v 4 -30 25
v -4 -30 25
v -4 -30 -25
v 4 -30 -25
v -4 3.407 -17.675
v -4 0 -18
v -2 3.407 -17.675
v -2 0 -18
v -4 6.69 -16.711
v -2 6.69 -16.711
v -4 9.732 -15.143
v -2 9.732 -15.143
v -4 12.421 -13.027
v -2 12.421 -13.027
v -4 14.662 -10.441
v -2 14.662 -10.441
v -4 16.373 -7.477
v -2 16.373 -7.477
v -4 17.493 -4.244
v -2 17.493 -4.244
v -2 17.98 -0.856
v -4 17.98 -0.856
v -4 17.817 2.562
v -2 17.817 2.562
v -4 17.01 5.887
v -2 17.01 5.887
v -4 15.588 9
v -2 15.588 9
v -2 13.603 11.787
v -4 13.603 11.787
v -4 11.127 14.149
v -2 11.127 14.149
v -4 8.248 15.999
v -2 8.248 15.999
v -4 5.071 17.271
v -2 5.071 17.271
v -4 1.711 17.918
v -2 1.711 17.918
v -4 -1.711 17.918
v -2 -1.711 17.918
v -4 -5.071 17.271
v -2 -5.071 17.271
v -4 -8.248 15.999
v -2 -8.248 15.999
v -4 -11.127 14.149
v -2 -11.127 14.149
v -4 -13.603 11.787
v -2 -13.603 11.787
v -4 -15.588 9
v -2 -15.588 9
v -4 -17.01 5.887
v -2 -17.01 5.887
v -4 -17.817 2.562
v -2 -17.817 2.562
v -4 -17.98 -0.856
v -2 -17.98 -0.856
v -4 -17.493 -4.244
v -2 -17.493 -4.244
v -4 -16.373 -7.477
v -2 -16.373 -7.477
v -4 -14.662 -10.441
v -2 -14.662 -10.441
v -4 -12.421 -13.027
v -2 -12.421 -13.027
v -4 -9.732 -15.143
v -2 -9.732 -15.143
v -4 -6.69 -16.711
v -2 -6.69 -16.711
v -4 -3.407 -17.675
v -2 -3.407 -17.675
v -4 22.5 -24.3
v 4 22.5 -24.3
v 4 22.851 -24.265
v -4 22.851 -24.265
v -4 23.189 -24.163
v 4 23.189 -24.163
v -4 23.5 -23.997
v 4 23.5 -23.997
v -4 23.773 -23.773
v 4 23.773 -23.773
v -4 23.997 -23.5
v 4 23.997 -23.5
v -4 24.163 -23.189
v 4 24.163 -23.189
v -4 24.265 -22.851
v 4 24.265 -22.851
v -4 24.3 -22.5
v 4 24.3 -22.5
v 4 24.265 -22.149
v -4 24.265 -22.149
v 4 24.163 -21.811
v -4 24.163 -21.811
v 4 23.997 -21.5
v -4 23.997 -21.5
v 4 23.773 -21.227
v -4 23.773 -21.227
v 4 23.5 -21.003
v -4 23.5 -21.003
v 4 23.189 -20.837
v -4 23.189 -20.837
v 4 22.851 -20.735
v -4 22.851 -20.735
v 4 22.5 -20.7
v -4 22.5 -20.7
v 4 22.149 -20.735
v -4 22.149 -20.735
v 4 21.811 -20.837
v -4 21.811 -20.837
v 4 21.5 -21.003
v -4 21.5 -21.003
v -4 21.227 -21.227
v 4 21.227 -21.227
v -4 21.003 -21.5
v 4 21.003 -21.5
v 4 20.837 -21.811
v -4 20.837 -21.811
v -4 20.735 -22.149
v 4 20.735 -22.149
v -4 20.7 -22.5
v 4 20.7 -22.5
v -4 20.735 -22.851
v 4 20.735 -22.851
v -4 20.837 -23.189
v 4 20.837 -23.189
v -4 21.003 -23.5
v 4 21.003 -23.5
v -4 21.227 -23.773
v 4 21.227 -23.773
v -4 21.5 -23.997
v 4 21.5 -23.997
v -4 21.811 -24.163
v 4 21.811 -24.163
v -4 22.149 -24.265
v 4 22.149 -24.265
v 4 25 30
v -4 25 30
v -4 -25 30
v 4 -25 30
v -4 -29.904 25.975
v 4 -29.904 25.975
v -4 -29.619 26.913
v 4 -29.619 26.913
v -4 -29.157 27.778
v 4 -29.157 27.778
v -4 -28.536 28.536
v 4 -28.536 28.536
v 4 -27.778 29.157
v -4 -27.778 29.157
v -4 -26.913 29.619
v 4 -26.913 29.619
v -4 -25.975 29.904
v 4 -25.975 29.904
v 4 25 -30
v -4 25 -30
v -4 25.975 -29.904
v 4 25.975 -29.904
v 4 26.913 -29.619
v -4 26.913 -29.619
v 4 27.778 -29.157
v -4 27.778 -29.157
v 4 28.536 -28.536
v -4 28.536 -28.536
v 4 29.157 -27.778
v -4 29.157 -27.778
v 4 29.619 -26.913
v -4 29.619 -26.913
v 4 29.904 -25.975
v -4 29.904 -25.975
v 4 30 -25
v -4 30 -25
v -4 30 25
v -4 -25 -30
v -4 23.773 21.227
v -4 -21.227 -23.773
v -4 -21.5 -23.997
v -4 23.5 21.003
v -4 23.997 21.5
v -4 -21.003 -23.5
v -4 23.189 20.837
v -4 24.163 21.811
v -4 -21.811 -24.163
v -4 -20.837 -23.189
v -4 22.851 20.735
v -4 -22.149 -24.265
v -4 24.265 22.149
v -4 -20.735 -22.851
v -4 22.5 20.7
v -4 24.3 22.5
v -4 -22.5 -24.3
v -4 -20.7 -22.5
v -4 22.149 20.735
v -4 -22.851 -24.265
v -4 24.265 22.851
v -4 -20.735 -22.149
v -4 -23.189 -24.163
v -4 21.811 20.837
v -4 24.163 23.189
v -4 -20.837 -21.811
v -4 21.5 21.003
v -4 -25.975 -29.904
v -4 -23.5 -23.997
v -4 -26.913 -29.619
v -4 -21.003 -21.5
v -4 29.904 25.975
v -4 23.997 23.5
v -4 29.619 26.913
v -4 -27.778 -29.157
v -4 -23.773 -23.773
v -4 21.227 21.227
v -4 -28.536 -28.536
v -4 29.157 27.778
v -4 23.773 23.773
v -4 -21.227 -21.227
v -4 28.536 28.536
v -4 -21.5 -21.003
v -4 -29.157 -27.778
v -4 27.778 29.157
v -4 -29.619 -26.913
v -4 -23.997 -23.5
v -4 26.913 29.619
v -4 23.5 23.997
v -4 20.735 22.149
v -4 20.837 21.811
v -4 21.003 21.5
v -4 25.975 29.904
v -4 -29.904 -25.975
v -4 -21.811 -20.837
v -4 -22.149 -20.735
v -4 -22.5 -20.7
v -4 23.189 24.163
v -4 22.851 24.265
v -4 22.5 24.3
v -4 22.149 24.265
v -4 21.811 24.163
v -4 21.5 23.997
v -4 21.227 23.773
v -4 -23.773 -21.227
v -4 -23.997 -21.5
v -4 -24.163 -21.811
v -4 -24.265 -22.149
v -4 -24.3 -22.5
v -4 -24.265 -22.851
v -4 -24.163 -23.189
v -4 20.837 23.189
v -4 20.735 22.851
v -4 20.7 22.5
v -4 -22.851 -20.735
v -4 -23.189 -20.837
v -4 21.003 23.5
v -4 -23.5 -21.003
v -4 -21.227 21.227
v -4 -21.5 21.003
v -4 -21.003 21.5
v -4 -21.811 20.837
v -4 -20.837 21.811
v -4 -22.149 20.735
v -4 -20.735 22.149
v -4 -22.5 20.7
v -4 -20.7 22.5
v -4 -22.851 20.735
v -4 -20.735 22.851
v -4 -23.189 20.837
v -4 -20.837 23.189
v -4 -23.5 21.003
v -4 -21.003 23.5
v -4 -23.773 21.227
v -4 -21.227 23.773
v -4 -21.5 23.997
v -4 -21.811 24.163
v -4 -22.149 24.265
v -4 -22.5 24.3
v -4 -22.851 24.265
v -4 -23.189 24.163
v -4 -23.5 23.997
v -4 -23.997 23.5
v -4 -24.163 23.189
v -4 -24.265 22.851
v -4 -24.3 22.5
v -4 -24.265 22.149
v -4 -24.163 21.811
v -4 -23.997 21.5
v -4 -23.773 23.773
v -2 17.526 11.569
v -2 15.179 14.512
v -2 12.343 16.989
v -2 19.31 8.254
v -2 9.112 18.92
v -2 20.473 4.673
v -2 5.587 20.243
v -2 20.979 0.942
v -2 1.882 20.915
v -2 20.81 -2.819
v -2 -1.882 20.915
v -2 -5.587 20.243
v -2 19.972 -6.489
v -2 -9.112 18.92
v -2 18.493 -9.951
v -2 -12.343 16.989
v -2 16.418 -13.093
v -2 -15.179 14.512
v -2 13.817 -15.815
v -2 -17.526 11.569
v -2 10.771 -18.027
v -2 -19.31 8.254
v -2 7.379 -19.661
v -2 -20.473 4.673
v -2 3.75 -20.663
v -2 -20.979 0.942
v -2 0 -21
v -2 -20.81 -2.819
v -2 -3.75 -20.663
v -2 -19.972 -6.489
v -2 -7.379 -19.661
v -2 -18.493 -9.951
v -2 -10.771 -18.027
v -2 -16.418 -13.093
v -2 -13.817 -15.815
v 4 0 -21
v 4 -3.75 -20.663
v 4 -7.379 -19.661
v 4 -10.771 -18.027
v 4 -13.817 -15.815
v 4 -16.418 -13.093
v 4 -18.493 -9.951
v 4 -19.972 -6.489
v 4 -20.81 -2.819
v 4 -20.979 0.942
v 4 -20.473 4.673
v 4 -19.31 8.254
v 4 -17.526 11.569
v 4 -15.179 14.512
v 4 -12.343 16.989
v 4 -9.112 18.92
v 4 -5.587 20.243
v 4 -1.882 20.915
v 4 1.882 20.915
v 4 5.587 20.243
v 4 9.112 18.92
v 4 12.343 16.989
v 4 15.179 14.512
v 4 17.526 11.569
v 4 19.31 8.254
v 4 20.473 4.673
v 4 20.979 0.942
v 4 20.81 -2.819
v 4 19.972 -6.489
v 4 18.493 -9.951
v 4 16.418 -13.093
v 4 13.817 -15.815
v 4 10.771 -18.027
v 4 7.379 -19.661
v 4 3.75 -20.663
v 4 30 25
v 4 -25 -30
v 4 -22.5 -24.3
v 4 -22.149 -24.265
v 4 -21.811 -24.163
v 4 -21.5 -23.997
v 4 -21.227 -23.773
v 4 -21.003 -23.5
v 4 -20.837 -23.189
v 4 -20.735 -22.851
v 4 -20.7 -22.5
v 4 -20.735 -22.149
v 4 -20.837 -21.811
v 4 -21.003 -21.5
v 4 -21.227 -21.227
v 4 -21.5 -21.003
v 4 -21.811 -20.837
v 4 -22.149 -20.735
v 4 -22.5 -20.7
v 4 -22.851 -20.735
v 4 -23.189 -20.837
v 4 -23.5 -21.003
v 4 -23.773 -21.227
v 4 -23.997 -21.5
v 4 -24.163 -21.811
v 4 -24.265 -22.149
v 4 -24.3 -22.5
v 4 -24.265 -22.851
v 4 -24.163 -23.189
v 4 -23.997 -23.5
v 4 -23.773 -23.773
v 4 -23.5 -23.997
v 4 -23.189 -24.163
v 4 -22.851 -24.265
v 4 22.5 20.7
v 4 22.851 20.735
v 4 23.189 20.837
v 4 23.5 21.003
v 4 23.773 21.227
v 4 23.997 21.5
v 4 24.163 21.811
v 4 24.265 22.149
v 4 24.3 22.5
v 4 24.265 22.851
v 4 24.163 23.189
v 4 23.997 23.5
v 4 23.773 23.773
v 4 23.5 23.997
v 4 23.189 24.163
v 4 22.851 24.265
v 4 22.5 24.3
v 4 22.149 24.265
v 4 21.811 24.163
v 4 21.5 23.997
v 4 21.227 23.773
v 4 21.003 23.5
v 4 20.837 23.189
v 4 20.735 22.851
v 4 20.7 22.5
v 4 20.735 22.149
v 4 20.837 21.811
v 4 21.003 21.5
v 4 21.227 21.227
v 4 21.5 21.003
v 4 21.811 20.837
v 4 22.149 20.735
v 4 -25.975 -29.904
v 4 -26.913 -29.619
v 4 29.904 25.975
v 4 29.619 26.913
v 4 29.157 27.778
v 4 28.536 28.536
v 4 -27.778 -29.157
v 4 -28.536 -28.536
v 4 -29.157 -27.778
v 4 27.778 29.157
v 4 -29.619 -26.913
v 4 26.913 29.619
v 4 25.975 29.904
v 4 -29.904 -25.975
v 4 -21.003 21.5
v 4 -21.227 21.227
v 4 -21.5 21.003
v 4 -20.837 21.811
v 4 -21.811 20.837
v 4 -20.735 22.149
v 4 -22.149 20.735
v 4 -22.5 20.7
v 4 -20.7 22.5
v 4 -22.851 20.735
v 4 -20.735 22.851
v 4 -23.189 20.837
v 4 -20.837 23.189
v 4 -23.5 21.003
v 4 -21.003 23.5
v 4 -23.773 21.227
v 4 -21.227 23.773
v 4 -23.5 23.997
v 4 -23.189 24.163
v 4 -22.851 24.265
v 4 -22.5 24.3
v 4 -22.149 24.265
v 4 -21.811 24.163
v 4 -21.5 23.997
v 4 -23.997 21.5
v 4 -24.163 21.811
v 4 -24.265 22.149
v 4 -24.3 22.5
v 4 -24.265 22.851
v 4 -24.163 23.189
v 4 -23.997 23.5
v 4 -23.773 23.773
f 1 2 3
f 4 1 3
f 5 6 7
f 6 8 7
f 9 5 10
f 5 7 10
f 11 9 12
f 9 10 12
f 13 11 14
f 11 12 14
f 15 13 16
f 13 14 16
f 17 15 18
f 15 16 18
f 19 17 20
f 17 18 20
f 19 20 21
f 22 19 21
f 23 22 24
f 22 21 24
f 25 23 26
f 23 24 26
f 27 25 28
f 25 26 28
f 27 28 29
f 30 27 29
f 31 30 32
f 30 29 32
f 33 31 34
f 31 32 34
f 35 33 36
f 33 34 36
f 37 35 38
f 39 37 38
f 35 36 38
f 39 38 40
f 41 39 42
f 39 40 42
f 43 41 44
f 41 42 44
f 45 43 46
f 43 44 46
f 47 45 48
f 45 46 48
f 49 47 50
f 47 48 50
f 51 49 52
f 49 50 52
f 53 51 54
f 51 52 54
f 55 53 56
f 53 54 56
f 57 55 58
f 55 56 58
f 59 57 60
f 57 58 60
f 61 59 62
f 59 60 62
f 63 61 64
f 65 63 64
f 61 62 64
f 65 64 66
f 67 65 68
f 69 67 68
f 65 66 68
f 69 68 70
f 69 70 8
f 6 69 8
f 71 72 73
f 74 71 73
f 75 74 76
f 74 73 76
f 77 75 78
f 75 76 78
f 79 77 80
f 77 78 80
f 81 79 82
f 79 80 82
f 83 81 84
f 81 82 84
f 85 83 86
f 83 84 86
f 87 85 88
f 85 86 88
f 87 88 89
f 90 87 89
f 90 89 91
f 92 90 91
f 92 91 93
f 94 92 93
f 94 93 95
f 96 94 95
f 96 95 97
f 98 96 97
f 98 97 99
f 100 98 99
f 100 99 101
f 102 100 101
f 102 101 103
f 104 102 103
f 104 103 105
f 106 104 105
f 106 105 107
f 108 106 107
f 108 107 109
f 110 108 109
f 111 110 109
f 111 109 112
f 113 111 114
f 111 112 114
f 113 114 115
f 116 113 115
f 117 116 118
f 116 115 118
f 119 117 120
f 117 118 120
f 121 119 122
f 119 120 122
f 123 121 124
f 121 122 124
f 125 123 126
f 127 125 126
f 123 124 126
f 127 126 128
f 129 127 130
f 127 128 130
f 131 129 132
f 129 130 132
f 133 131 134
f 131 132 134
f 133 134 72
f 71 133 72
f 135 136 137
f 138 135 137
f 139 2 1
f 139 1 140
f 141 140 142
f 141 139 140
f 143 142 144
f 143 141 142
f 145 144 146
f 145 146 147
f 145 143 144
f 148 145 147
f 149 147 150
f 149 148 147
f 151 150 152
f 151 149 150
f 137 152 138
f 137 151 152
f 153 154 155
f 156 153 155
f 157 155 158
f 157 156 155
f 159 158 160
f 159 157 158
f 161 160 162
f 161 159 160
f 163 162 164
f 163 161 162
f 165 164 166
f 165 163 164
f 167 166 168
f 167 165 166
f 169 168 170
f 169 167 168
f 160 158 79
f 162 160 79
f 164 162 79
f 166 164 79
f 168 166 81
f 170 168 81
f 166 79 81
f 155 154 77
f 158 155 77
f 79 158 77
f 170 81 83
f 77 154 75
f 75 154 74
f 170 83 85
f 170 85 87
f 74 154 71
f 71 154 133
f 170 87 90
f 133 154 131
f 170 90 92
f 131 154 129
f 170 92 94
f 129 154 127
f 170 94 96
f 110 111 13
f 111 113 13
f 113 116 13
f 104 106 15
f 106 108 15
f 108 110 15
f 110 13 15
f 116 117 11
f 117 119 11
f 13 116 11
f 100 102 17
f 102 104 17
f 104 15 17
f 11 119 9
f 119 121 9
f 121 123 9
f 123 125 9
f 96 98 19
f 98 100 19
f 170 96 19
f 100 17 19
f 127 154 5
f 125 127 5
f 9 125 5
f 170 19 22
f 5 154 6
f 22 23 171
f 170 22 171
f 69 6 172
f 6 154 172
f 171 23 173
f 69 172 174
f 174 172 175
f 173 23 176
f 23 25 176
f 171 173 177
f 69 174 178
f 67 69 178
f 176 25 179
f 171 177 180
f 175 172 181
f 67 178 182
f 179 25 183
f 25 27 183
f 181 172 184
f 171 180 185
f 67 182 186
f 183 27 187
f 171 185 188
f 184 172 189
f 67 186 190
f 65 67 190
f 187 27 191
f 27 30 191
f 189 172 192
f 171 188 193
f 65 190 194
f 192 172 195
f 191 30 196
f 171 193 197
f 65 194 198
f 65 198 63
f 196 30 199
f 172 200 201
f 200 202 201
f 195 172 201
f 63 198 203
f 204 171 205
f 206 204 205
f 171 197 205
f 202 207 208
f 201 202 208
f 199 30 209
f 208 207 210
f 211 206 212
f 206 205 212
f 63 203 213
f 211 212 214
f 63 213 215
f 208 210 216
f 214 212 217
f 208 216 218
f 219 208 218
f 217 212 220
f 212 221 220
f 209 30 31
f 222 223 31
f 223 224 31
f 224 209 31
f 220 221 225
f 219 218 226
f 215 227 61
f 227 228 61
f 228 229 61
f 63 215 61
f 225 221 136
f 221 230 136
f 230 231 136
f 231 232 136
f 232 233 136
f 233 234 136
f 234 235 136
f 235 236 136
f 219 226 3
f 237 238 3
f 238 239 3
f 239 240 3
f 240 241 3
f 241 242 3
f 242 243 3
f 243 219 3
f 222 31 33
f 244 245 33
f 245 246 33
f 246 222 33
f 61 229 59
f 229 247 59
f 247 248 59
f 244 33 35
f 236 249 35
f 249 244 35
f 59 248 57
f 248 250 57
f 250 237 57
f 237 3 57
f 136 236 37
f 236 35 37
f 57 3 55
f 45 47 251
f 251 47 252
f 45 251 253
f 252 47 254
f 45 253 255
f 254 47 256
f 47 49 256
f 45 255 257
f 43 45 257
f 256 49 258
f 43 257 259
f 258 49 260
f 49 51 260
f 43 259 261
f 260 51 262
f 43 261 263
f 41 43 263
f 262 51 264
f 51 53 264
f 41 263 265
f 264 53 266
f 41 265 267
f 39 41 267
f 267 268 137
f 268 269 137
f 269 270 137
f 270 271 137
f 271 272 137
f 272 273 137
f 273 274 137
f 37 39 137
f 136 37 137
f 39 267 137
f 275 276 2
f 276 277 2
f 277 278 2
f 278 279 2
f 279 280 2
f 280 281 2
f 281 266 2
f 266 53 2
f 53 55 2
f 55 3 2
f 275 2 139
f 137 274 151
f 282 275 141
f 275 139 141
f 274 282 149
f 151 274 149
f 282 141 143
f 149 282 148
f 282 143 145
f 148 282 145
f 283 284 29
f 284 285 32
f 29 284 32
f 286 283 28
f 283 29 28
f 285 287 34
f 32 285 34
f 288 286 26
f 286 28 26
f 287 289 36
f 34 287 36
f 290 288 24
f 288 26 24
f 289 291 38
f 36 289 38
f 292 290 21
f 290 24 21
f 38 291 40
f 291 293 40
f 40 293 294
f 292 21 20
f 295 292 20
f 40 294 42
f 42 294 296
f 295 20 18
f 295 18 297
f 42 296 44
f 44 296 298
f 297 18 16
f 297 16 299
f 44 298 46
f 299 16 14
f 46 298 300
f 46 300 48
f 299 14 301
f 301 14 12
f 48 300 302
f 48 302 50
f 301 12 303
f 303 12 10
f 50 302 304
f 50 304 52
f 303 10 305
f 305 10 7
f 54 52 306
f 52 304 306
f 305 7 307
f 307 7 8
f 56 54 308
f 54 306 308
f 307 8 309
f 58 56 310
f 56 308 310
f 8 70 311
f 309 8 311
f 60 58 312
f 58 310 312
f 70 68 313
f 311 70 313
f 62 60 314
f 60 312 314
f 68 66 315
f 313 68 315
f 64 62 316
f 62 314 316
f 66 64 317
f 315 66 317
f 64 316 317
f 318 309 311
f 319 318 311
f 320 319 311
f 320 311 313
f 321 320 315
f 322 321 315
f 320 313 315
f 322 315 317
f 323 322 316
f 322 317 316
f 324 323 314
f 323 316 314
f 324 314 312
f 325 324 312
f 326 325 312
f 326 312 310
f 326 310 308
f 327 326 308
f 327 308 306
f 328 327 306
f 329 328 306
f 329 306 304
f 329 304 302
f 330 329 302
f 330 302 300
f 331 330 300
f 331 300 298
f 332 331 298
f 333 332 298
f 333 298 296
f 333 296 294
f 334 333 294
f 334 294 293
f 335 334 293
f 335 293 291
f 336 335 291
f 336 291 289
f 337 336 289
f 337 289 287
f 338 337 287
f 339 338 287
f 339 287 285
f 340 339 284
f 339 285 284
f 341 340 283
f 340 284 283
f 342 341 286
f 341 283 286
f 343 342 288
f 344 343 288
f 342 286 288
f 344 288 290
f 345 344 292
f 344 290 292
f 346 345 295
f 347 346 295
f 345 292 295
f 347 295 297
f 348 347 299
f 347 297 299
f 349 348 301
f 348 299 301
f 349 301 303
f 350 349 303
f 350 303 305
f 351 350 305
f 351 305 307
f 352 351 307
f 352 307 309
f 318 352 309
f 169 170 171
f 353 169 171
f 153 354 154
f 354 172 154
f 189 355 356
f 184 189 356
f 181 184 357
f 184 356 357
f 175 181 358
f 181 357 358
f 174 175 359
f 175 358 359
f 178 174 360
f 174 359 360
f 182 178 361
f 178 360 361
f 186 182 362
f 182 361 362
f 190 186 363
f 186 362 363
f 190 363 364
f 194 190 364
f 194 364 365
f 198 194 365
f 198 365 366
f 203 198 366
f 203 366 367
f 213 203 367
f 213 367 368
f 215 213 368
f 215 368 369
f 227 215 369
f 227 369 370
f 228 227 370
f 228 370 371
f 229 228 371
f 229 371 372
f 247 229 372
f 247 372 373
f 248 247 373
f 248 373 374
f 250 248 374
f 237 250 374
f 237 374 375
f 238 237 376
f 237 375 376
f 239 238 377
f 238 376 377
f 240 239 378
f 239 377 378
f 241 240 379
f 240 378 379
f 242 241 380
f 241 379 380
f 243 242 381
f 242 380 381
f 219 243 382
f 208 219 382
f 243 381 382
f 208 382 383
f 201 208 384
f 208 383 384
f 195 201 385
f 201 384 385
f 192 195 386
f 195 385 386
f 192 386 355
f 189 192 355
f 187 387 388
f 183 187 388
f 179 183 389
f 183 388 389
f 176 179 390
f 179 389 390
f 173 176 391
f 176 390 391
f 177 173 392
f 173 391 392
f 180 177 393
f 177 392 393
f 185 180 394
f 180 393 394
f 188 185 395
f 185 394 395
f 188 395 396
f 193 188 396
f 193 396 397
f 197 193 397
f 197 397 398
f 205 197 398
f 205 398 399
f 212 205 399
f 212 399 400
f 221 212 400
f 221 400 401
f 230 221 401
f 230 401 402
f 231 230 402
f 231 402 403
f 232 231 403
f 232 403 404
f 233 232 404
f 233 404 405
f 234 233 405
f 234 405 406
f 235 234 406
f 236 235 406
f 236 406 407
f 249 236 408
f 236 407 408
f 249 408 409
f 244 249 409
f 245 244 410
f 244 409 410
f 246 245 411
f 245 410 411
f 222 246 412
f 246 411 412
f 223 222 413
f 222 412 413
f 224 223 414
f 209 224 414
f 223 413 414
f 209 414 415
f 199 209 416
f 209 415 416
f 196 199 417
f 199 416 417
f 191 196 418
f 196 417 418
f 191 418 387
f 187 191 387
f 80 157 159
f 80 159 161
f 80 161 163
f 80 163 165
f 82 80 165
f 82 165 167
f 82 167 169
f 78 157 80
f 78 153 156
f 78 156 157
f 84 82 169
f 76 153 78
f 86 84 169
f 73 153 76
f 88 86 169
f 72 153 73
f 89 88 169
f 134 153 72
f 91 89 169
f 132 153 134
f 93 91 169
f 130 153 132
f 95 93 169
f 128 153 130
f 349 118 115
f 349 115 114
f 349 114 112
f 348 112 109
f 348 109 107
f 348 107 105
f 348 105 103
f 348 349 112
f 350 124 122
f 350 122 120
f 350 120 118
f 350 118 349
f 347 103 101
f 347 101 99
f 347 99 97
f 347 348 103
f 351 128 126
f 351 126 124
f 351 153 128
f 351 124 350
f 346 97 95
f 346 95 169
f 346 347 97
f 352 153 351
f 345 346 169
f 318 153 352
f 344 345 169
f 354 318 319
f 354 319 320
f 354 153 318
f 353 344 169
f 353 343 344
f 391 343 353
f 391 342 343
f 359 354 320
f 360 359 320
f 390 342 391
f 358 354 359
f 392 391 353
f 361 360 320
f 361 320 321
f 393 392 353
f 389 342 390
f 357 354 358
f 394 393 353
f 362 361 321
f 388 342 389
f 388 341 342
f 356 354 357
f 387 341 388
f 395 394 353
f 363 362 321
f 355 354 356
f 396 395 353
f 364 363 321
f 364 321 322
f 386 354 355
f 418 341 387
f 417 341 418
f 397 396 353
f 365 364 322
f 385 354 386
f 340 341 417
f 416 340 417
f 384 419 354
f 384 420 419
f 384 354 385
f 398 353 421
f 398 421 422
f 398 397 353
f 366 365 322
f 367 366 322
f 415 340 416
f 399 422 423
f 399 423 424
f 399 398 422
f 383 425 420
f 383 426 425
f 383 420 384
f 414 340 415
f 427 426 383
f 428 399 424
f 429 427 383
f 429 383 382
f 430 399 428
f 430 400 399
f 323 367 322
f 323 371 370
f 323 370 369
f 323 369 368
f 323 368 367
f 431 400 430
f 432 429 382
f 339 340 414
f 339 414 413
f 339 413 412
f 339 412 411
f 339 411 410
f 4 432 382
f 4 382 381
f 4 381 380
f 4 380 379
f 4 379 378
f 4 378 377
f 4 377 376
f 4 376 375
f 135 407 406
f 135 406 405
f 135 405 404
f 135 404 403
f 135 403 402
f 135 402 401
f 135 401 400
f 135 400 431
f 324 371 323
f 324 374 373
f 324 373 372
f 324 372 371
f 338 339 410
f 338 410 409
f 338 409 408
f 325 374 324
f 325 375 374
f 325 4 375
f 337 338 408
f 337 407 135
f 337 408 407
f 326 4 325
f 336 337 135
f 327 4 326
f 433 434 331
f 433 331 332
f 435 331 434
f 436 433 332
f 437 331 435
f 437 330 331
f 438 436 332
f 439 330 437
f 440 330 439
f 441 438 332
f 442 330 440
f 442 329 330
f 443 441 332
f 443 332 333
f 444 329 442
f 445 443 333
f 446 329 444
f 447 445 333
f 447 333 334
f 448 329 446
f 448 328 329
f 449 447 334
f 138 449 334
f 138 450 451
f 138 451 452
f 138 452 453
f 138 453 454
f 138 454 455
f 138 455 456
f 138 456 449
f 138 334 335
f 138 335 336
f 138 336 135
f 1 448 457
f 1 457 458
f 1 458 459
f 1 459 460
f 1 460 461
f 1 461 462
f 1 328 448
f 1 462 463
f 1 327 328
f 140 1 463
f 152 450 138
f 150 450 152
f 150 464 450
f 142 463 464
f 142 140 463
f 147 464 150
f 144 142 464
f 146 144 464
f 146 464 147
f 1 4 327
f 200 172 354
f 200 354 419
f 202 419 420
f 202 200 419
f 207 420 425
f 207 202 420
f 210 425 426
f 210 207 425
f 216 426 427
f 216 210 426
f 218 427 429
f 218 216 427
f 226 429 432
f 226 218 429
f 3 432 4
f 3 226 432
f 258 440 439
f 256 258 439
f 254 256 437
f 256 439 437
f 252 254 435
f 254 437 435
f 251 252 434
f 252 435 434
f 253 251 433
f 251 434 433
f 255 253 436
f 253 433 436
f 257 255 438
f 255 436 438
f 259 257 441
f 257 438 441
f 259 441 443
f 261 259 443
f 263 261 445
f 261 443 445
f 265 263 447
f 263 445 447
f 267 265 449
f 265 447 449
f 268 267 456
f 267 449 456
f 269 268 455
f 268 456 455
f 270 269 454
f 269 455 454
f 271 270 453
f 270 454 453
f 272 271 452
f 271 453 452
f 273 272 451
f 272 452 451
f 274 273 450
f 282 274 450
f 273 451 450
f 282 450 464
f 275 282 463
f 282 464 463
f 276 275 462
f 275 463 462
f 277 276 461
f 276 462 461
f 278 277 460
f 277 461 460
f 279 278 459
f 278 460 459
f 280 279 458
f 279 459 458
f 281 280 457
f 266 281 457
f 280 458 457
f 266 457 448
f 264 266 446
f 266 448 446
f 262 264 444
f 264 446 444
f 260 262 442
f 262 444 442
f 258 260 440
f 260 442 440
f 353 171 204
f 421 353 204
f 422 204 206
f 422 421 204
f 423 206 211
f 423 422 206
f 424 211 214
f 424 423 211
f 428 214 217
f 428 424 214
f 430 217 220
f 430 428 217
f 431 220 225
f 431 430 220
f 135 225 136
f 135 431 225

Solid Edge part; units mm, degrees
sketch "Sketch1" plane through (0, 0, 0) normal (1, 0, 0) x (0, 1, 0)
  line L0 (-30, -30) -> (30, -30)
  line L1 (30, -30) -> (30, 30)
  line L2 (30, 30) -> (-30, 30)
  line L3 (-30, 30) -> (-30, -30)
  dimension "D1" = 60
  dimension "D2" = 60
extrude "Protrusion1" add sketch "Sketch1" along normal mid plane 8
hole "Hole_1" at (4, -22.5, 22.5) direction (-1, 0, 0) diameter 3.6 end up to next
hole "Hole1" at (4, 22.5, 22.5) direction (-1, 0, 0) diameter 3.6 end up to next
hole "Hole2" at (4, 22.5, -22.5) direction (-1, 0, 0) diameter 3.6 end up to next
hole "Hole3" at (4, -22.5, -22.5) direction (-1, 0, 0) diameter 3.6 end up to next
hole "Hole_5" at (4, 0, 0) direction (-1, 0, 0) diameter 36 end up to next counterbore diameter 42 counterbore depth 6
fillet "Round_1" radius 5 4 edges at (0, 30, -30) (0, -30, -30) (0, -30, 30) (0, 30, 30)
properties material "Polyethylene, low density"
